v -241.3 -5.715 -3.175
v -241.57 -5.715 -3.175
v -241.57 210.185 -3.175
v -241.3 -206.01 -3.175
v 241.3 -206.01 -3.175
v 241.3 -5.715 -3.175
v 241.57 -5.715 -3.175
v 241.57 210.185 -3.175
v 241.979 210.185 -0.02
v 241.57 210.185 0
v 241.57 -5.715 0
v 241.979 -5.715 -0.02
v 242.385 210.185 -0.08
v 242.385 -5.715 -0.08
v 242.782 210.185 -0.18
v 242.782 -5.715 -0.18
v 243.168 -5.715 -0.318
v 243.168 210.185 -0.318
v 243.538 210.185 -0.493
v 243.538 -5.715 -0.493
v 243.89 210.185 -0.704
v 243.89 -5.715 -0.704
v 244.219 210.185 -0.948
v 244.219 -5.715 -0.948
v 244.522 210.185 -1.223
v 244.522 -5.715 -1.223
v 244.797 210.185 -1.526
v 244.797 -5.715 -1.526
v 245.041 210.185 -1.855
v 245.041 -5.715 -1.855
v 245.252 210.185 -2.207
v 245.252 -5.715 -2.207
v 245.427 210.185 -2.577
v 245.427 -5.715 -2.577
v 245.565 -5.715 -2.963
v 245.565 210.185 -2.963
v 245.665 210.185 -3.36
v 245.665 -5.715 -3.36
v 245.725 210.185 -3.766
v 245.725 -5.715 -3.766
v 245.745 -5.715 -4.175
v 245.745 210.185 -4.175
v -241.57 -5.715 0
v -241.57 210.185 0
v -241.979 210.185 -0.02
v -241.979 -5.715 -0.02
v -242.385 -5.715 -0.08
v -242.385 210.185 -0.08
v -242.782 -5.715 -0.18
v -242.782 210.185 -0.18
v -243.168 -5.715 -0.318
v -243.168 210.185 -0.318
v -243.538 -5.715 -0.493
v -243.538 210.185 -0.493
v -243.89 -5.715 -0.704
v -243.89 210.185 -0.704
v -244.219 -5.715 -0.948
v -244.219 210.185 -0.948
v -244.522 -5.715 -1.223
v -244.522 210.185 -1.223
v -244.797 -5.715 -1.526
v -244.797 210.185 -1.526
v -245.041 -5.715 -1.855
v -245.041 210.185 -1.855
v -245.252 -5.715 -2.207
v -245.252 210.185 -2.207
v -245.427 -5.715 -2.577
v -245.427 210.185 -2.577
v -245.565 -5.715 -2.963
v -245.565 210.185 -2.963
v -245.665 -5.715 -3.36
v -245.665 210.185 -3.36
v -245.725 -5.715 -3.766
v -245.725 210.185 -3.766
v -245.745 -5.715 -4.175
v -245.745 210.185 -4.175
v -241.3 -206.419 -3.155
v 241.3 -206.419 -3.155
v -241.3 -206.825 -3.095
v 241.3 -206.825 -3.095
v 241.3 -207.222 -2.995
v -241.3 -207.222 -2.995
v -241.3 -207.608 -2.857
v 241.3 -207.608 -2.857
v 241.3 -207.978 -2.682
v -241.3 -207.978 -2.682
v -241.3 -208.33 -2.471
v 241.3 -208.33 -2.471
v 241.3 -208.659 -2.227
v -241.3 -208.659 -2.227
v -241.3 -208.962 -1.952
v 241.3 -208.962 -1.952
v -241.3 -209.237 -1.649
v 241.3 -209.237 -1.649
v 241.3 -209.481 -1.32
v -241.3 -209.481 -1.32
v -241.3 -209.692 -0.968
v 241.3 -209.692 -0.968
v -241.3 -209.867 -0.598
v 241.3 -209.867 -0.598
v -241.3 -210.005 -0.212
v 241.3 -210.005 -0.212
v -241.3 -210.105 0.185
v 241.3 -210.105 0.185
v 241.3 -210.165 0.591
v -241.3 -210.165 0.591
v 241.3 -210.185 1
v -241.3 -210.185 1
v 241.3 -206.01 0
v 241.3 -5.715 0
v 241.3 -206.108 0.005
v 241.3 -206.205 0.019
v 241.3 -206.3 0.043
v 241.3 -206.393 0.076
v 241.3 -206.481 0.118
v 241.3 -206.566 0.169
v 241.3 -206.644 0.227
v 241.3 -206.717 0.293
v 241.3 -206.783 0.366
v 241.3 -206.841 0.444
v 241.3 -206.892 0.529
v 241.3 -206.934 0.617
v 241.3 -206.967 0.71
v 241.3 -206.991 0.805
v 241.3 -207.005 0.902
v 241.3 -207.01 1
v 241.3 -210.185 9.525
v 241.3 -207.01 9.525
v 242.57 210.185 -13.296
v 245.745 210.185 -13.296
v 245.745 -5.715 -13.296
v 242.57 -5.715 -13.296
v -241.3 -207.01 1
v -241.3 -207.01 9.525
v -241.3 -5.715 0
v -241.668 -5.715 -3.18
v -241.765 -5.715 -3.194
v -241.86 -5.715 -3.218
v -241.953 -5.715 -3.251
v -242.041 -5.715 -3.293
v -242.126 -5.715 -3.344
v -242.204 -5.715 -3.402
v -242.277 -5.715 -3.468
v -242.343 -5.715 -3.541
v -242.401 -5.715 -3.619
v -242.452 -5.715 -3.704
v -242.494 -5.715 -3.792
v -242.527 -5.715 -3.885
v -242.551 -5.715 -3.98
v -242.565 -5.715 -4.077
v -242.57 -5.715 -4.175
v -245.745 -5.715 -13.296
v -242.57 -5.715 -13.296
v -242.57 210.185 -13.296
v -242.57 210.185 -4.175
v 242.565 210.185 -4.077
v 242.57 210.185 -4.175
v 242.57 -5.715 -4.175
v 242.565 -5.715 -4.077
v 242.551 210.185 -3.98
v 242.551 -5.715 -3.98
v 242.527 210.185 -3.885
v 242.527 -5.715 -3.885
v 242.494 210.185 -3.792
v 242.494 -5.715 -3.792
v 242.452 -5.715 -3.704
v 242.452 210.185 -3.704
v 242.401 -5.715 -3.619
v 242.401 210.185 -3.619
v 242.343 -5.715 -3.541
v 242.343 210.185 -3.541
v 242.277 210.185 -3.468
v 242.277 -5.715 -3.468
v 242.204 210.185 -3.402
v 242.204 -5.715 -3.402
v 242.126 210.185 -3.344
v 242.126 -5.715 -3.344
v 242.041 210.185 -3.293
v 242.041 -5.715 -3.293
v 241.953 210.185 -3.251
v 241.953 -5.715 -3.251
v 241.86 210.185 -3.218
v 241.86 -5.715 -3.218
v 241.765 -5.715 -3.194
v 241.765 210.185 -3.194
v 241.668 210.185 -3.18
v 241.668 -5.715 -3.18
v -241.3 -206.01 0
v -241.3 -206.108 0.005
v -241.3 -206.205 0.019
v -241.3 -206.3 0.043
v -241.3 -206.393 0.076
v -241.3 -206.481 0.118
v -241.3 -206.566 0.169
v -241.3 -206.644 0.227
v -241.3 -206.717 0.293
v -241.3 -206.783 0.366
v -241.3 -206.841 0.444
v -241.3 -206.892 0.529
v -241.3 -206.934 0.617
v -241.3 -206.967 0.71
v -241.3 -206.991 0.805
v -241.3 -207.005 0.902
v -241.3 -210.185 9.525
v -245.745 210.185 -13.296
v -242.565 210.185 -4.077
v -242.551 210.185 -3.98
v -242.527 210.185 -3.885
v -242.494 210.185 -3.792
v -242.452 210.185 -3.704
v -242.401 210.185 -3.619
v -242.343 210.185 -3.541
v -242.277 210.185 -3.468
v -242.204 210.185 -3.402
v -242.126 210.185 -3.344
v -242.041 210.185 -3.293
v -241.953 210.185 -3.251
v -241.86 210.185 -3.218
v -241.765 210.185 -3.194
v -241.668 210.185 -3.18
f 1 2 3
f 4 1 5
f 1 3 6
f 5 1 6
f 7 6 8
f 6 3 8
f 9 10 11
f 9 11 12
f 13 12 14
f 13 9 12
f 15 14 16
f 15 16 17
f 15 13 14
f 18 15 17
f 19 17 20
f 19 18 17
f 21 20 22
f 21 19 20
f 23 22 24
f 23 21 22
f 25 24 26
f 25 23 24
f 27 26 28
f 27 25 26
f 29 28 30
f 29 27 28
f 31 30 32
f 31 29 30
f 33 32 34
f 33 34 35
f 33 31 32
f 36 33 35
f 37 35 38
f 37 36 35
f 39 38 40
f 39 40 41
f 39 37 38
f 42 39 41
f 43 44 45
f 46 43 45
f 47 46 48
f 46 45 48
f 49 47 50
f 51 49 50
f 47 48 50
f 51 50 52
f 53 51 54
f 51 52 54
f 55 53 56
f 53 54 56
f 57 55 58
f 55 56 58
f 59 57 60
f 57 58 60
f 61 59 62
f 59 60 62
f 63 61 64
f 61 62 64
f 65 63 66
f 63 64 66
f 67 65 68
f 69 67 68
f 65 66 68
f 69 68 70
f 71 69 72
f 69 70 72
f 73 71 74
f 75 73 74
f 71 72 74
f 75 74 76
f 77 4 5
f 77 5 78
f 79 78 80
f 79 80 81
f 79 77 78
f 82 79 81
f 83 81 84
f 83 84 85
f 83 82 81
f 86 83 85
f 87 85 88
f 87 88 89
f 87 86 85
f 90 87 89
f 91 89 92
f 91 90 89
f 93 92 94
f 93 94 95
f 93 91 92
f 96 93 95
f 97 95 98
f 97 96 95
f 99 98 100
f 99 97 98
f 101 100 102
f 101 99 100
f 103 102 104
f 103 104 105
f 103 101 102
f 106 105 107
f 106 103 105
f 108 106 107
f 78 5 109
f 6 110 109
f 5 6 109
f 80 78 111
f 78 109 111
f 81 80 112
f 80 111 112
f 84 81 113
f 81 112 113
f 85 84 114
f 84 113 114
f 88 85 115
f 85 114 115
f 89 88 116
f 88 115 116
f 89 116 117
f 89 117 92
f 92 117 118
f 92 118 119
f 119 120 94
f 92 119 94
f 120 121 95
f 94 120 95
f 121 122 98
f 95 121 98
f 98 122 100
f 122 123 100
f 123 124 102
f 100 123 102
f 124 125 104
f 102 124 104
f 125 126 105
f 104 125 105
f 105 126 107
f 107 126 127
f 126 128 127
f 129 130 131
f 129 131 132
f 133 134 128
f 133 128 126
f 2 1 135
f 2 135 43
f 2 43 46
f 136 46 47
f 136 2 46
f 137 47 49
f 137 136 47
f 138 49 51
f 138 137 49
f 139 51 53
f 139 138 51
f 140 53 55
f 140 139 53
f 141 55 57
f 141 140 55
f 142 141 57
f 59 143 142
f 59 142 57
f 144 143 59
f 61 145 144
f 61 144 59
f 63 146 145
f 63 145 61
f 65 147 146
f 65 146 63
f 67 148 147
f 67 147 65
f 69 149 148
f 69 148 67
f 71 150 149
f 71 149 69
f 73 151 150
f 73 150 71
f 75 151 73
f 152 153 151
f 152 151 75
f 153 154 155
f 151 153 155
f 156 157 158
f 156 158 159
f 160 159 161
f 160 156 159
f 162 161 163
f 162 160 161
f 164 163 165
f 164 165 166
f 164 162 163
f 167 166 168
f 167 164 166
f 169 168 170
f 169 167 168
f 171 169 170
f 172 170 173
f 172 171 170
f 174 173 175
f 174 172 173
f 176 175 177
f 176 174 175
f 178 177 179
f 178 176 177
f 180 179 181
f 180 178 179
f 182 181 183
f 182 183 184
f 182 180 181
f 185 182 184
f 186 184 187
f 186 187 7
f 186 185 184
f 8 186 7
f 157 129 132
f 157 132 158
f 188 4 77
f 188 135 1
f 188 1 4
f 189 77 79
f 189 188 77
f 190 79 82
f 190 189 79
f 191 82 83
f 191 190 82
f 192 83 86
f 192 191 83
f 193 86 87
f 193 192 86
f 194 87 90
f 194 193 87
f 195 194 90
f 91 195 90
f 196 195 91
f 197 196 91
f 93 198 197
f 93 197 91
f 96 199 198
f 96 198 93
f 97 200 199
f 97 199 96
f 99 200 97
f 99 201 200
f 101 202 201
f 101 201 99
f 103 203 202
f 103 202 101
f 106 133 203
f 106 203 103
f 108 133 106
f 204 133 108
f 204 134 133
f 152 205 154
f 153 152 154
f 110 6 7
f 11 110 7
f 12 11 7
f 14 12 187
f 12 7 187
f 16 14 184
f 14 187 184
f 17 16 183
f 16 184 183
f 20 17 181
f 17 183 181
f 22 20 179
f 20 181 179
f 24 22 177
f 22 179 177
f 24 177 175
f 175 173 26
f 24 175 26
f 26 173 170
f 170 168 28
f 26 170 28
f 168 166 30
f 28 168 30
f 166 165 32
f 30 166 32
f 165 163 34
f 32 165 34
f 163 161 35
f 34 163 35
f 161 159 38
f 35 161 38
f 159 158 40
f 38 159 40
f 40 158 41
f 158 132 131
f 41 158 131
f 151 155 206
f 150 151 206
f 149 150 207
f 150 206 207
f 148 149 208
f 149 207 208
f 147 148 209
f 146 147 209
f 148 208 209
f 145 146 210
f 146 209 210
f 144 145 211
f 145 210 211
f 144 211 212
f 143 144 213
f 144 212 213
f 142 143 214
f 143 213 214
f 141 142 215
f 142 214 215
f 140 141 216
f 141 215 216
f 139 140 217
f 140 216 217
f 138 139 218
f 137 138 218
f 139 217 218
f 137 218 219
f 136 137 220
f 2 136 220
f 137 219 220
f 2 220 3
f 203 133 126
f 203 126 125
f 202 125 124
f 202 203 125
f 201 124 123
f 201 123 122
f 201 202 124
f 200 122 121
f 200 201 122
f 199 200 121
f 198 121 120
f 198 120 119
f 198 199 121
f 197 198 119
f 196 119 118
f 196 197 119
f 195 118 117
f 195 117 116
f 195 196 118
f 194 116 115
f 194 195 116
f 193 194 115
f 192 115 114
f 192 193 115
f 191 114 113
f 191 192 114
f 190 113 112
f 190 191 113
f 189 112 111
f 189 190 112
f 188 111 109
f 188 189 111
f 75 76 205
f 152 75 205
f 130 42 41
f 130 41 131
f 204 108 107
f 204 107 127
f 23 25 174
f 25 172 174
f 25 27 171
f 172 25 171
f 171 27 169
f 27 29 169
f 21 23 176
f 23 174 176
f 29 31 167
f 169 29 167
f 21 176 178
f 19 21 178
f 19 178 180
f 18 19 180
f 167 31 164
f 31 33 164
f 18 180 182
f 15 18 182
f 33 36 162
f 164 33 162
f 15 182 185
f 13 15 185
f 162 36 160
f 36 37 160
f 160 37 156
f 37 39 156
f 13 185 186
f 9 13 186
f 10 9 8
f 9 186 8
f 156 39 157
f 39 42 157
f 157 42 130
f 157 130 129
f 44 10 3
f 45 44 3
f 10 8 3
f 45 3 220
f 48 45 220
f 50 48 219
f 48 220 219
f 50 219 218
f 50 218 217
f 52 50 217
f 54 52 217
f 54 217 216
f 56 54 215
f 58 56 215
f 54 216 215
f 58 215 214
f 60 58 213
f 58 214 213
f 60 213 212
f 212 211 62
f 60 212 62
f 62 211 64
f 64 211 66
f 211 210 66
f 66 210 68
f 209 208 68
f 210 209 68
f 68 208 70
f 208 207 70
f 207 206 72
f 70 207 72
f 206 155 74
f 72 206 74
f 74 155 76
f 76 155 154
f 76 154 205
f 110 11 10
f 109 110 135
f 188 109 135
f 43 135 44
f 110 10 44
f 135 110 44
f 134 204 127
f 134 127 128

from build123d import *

# Parameters (mm, degrees)
SKETCH1_W                    = 482.6
SKETCH1_H                    = 420.37
BASE_FLANGE1_DEPTH           = 3.175
EDGE_FLANGE1_STRIP_W         = 14.7
EDGE_FLANGE1_STRIP_H         = 3.175
EDGE_FLANGE1_STRIP_CUT_DEPTH = 482.6
EDGE_FLANGE1_DEPTH           = 482.6
EDGE_FLANGE3_DEPTH           = 215.9


# Sheet-metal steps are written as plain solids
with BuildPart() as part:
    # Sketch1 → Base-Flange1 (new body)
    with BuildSketch(Plane.XY):
        Rectangle(SKETCH1_W, SKETCH1_H)
    extrude(amount=-BASE_FLANGE1_DEPTH)

    # Edge-Flange1 strip (across the edge) → Edge-Flange1 strip cut (cut)
    with BuildSketch(Plane(origin=(-241.3, -210.185, 0), x_dir=(0, 1, 0), z_dir=(1, 0, 0))):
        with Locations((-3.175, -1.5875)):
            Rectangle(EDGE_FLANGE1_STRIP_W, EDGE_FLANGE1_STRIP_H)
    extrude(amount=EDGE_FLANGE1_STRIP_CUT_DEPTH, mode=Mode.SUBTRACT)

    # Edge-Flange1 section (across the edge) → Edge-Flange1 (add)
    with BuildSketch(Plane(origin=(-241.3, -210.185, 0), x_dir=(0, 1, 0), z_dir=(1, 0, 0))):
        with BuildLine():
            Line((0, 1), (0, 9.525))
            Line((0, 9.525), (3.175, 9.525))
            Line((3.175, 9.525), (3.175, 1))
            ThreePointArc((3.175, 1), (3.467893219, 0.292893219), (4.175, 0))
            Line((4.175, 0), (4.175, -3.175))
            ThreePointArc((4.175, -3.175), (1.222829189, -1.952170811), (0, 1))
        make_face()
    extrude(amount=EDGE_FLANGE1_DEPTH)

    # Edge-Flange3 section (across the edge) → Edge-Flange3 (add)
    with BuildSketch(Plane(origin=(242.57, 210.185, -3.175), x_dir=(-1, 0, 0), z_dir=(0, -1, 0))):
        with BuildLine():
            Line((-3.175, 1), (-3.175, 10.120953567))
            Line((-3.175, 10.120953567), (0, 10.120953567))
            Line((0, 10.120953567), (0, 1))
            ThreePointArc((0, 1), (0.292893219, 0.292893219), (1, 0))
            Line((1, 0), (1.27, 0))
            Line((1.27, 0), (1.27, -3.175))
            Line((1.27, -3.175), (1, -3.175))
            ThreePointArc((1, -3.175), (-1.952170811, -1.952170811), (-3.175, 1))
        make_face()
    edge_flange3 = extrude(amount=EDGE_FLANGE3_DEPTH)

    # Mirror2: Edge-Flange3 across plane
    add(edge_flange3.mirror(Plane(origin=(0, 0, 0), x_dir=(0, 0, 1), z_dir=(1, 0, 0))))


solid = part.part
